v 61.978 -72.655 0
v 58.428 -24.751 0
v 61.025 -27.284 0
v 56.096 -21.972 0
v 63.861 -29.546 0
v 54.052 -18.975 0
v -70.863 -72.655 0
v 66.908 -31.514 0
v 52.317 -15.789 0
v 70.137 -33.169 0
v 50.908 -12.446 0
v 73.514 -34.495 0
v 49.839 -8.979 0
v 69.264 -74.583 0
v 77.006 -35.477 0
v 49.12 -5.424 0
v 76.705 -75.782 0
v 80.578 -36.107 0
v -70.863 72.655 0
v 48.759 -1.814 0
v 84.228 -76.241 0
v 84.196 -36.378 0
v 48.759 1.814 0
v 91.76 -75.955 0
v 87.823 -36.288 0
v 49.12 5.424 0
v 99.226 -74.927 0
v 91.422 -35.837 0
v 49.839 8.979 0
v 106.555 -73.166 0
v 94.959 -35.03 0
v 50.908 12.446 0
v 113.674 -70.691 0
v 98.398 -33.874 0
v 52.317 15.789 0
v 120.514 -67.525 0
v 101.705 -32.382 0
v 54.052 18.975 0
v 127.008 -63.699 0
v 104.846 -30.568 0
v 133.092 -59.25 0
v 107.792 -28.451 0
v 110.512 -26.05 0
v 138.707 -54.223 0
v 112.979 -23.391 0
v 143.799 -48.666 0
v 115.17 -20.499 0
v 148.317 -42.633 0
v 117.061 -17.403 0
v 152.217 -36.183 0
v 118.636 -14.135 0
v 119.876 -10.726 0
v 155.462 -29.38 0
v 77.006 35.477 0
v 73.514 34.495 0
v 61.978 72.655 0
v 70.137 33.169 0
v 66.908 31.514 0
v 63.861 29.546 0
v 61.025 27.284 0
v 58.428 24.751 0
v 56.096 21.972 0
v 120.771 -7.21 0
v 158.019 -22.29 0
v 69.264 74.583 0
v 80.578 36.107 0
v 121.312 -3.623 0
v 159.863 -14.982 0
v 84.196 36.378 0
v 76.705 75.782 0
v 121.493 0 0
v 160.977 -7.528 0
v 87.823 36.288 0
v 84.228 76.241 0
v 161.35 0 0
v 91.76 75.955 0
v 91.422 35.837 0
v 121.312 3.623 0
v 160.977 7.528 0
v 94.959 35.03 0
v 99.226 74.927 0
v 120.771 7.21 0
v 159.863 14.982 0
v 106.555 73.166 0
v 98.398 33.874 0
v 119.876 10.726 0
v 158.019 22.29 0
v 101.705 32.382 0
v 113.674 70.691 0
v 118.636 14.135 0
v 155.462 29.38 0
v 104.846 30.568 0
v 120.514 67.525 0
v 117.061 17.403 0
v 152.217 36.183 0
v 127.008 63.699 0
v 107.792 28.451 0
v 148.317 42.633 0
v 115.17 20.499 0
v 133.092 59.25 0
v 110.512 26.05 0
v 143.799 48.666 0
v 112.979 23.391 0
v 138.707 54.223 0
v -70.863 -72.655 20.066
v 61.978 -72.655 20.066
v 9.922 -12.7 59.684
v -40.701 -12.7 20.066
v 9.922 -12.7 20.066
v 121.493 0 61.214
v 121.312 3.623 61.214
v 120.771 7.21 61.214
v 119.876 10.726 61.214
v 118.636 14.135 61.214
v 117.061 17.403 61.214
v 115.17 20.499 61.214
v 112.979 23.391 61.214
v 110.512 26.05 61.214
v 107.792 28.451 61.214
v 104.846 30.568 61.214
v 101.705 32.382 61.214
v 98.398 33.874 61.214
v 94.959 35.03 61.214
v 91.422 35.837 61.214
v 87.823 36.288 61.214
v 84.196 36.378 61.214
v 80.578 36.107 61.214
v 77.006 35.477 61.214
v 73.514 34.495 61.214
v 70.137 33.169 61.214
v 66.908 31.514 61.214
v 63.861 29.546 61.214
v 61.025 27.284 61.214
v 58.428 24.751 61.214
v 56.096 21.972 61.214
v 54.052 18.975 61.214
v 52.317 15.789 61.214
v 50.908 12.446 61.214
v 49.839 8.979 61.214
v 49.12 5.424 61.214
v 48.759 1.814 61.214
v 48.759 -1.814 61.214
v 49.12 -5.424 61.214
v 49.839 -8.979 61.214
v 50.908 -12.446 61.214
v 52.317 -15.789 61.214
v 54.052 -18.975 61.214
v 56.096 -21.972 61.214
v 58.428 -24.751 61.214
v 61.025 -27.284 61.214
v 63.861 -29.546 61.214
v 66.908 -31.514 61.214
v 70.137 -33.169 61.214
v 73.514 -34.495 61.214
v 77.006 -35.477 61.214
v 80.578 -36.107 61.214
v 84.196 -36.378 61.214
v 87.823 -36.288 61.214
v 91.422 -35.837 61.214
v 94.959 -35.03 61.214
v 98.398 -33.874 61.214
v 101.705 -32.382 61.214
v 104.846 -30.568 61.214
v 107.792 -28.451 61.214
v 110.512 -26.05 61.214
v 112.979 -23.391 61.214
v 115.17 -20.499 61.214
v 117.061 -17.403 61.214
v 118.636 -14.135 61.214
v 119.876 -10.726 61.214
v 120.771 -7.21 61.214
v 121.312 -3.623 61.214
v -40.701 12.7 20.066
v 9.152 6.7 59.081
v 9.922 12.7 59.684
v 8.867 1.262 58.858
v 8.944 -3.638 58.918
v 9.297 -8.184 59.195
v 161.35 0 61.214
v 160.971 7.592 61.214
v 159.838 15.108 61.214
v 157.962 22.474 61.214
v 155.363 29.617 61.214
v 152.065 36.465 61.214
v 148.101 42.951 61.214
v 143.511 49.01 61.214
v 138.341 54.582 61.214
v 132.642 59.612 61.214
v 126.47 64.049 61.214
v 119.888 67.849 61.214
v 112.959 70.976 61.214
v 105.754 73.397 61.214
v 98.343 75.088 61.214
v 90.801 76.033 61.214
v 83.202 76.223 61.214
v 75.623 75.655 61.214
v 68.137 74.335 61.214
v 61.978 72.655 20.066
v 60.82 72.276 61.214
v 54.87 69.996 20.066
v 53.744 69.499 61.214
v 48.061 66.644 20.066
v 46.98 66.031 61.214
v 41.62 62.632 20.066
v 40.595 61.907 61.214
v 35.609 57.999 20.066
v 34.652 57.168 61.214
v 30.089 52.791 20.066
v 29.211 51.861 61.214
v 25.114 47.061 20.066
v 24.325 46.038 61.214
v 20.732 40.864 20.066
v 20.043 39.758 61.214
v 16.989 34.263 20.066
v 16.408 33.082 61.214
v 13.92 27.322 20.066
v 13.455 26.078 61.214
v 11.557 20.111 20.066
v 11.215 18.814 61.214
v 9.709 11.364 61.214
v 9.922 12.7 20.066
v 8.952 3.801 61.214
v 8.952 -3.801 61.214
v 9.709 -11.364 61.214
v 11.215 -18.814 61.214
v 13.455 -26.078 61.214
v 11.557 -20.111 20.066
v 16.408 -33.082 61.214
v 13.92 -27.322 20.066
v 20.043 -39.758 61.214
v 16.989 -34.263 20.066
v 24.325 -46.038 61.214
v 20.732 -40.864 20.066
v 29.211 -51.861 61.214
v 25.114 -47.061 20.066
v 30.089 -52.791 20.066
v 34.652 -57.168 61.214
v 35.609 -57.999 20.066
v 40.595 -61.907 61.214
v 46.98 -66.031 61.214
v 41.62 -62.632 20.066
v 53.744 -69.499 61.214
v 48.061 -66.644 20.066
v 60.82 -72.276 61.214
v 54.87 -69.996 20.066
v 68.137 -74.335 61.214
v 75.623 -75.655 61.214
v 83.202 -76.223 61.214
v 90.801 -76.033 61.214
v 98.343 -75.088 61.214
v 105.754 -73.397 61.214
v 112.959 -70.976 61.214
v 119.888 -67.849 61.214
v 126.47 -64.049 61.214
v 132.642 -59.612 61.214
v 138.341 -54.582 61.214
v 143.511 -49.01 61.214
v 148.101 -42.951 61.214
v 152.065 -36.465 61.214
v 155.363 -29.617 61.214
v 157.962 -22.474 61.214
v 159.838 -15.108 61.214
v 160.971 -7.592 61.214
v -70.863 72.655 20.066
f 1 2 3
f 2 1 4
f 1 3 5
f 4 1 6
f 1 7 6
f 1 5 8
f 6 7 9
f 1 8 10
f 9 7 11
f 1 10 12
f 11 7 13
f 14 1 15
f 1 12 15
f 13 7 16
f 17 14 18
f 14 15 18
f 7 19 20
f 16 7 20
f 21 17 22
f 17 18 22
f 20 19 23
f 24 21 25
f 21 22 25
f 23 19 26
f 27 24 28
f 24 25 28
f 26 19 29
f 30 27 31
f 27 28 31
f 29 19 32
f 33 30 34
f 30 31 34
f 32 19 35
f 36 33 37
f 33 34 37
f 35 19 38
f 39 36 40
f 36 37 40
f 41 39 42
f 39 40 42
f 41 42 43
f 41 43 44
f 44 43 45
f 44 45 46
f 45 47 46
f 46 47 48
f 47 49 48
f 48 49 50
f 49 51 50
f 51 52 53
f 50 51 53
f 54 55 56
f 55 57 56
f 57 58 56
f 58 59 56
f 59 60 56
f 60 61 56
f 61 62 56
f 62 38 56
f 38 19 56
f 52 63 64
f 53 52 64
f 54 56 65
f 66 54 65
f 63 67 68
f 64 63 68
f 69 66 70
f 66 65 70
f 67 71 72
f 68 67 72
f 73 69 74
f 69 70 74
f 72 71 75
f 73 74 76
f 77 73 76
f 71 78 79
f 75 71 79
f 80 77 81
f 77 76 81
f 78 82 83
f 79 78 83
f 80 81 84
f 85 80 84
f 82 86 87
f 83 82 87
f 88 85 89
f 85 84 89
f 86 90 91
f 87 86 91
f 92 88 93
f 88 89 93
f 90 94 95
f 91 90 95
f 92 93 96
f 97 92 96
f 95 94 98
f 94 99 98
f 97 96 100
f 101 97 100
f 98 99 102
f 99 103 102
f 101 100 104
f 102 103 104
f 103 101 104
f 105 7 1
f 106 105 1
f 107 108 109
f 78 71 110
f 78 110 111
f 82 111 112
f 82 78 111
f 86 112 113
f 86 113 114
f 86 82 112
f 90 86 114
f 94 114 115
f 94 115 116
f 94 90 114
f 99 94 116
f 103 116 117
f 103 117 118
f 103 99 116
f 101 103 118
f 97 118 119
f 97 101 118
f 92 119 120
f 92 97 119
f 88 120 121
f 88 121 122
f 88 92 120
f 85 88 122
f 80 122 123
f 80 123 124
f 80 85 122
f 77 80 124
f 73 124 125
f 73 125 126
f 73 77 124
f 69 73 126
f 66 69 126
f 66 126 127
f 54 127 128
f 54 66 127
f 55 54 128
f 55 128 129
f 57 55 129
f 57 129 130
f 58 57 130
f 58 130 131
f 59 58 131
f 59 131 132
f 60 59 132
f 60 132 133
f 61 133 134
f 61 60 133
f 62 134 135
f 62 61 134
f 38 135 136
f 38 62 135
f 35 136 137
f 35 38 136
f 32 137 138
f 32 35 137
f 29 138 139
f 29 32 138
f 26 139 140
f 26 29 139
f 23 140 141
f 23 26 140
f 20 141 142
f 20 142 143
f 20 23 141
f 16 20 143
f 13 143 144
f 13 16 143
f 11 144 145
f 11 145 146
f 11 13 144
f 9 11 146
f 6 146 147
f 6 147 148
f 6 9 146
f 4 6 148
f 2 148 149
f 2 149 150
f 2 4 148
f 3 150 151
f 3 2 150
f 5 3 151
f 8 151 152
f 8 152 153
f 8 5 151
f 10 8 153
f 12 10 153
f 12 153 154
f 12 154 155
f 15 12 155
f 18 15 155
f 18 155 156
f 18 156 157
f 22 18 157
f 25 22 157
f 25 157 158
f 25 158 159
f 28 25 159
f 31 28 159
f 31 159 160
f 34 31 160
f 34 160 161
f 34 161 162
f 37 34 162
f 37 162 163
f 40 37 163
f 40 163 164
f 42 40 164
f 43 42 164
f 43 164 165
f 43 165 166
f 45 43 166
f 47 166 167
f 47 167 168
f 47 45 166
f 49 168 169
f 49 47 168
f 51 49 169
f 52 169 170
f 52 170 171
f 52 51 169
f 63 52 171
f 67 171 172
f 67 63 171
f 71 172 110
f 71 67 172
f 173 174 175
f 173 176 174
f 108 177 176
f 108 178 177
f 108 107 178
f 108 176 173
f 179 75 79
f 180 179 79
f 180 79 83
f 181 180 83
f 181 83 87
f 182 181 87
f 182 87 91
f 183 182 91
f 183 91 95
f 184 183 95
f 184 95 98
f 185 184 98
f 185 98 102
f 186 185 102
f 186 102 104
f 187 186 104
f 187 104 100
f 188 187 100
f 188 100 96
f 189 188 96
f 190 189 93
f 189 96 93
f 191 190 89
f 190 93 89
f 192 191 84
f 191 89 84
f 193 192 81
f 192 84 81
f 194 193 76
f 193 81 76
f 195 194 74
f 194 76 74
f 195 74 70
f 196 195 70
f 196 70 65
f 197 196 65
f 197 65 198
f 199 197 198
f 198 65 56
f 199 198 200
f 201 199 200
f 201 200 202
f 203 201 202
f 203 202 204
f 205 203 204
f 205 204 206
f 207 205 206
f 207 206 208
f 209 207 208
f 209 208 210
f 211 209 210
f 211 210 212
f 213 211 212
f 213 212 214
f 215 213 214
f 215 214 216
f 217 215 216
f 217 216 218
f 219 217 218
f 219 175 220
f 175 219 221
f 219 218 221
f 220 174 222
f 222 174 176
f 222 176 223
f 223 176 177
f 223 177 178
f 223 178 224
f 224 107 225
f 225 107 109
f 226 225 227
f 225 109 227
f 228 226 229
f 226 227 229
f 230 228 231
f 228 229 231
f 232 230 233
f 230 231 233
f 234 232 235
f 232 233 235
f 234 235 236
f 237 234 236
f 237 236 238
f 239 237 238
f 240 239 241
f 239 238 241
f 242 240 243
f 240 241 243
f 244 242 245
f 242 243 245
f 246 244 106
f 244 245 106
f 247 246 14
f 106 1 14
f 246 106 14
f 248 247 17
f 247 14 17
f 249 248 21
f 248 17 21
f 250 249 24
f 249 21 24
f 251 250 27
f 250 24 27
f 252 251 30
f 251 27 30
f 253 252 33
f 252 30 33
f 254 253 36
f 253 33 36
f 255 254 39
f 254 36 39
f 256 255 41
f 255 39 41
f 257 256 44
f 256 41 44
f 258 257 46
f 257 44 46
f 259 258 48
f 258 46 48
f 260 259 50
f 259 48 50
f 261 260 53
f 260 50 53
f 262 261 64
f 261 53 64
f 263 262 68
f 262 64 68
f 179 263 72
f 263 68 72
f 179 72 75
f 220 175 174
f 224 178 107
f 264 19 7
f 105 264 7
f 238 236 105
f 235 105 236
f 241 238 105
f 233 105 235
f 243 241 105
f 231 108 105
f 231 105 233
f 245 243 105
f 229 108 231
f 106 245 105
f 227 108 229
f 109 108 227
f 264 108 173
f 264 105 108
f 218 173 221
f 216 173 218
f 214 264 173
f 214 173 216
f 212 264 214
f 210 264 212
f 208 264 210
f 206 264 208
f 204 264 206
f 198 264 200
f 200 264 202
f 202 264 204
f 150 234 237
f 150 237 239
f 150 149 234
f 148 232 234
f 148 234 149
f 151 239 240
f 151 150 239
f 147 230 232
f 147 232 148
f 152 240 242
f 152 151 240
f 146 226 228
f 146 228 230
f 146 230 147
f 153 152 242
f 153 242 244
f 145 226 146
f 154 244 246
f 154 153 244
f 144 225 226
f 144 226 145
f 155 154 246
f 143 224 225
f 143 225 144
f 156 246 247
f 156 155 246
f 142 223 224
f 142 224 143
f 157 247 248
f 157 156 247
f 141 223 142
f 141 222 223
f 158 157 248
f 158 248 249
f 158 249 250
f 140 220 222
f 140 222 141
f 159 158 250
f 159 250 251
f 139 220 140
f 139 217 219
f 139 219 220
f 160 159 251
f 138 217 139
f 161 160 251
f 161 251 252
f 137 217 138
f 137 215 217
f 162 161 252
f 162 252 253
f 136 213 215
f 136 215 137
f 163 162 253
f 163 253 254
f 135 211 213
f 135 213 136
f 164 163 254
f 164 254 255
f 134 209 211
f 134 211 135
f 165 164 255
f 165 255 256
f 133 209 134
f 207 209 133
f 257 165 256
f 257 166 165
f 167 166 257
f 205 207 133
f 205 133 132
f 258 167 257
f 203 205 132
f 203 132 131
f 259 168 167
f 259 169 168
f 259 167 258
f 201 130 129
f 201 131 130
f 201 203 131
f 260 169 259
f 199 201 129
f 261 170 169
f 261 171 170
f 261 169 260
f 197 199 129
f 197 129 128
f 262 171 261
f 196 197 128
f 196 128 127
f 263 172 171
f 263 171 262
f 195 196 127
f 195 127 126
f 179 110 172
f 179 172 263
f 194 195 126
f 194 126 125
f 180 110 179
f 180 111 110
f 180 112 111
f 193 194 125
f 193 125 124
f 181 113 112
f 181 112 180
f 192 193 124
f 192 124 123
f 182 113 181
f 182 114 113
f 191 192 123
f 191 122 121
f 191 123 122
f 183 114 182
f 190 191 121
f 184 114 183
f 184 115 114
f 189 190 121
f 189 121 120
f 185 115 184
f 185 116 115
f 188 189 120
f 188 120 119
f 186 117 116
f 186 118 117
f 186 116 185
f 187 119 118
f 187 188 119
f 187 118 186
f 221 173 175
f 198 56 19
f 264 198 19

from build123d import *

# Parameters (mm, degrees)
F1_DEPTH = 20.066
F2_R     = 76.246364
F2_R_2   = 36.389637
F3_DEPTH = 61.214
F5_DEPTH = 12.7


with BuildPart() as f1:
    # F0 (on Top) → F1 (new body)
    with BuildSketch(Plane.XY):
        with BuildLine():
            Line((-70.862994, -72.654791), (64.208811, -72.654791))
            ThreePointArc((64.208811, -72.654791), (22.925008, 0), (64.208811, 72.654791))
            Line((64.208811, 72.654791), (-70.862994, 72.654791))
            Line((-70.862994, 72.654791), (-70.862994, -72.654791))
        make_face()
    extrude(amount=F1_DEPTH)

    # F2 (on Top) → F3 (join)
    with BuildSketch(Plane.XY):
        with Locations((85.103318, 0)):
            Circle(F2_R)
        with Locations((85.103318, 0)):
            Circle(F2_R_2, mode=Mode.SUBTRACT)
    extrude(amount=F3_DEPTH)

    # F4 (on Front) → F5 (join, symmetric)
    with BuildSketch(Plane.XZ):
        Polygon((10.999451, 18.561568), (10.082829, 59.809498), (-42.622861, 18.561568), align=None)
    extrude(amount=F5_DEPTH, both=True)


solid = f1.part
